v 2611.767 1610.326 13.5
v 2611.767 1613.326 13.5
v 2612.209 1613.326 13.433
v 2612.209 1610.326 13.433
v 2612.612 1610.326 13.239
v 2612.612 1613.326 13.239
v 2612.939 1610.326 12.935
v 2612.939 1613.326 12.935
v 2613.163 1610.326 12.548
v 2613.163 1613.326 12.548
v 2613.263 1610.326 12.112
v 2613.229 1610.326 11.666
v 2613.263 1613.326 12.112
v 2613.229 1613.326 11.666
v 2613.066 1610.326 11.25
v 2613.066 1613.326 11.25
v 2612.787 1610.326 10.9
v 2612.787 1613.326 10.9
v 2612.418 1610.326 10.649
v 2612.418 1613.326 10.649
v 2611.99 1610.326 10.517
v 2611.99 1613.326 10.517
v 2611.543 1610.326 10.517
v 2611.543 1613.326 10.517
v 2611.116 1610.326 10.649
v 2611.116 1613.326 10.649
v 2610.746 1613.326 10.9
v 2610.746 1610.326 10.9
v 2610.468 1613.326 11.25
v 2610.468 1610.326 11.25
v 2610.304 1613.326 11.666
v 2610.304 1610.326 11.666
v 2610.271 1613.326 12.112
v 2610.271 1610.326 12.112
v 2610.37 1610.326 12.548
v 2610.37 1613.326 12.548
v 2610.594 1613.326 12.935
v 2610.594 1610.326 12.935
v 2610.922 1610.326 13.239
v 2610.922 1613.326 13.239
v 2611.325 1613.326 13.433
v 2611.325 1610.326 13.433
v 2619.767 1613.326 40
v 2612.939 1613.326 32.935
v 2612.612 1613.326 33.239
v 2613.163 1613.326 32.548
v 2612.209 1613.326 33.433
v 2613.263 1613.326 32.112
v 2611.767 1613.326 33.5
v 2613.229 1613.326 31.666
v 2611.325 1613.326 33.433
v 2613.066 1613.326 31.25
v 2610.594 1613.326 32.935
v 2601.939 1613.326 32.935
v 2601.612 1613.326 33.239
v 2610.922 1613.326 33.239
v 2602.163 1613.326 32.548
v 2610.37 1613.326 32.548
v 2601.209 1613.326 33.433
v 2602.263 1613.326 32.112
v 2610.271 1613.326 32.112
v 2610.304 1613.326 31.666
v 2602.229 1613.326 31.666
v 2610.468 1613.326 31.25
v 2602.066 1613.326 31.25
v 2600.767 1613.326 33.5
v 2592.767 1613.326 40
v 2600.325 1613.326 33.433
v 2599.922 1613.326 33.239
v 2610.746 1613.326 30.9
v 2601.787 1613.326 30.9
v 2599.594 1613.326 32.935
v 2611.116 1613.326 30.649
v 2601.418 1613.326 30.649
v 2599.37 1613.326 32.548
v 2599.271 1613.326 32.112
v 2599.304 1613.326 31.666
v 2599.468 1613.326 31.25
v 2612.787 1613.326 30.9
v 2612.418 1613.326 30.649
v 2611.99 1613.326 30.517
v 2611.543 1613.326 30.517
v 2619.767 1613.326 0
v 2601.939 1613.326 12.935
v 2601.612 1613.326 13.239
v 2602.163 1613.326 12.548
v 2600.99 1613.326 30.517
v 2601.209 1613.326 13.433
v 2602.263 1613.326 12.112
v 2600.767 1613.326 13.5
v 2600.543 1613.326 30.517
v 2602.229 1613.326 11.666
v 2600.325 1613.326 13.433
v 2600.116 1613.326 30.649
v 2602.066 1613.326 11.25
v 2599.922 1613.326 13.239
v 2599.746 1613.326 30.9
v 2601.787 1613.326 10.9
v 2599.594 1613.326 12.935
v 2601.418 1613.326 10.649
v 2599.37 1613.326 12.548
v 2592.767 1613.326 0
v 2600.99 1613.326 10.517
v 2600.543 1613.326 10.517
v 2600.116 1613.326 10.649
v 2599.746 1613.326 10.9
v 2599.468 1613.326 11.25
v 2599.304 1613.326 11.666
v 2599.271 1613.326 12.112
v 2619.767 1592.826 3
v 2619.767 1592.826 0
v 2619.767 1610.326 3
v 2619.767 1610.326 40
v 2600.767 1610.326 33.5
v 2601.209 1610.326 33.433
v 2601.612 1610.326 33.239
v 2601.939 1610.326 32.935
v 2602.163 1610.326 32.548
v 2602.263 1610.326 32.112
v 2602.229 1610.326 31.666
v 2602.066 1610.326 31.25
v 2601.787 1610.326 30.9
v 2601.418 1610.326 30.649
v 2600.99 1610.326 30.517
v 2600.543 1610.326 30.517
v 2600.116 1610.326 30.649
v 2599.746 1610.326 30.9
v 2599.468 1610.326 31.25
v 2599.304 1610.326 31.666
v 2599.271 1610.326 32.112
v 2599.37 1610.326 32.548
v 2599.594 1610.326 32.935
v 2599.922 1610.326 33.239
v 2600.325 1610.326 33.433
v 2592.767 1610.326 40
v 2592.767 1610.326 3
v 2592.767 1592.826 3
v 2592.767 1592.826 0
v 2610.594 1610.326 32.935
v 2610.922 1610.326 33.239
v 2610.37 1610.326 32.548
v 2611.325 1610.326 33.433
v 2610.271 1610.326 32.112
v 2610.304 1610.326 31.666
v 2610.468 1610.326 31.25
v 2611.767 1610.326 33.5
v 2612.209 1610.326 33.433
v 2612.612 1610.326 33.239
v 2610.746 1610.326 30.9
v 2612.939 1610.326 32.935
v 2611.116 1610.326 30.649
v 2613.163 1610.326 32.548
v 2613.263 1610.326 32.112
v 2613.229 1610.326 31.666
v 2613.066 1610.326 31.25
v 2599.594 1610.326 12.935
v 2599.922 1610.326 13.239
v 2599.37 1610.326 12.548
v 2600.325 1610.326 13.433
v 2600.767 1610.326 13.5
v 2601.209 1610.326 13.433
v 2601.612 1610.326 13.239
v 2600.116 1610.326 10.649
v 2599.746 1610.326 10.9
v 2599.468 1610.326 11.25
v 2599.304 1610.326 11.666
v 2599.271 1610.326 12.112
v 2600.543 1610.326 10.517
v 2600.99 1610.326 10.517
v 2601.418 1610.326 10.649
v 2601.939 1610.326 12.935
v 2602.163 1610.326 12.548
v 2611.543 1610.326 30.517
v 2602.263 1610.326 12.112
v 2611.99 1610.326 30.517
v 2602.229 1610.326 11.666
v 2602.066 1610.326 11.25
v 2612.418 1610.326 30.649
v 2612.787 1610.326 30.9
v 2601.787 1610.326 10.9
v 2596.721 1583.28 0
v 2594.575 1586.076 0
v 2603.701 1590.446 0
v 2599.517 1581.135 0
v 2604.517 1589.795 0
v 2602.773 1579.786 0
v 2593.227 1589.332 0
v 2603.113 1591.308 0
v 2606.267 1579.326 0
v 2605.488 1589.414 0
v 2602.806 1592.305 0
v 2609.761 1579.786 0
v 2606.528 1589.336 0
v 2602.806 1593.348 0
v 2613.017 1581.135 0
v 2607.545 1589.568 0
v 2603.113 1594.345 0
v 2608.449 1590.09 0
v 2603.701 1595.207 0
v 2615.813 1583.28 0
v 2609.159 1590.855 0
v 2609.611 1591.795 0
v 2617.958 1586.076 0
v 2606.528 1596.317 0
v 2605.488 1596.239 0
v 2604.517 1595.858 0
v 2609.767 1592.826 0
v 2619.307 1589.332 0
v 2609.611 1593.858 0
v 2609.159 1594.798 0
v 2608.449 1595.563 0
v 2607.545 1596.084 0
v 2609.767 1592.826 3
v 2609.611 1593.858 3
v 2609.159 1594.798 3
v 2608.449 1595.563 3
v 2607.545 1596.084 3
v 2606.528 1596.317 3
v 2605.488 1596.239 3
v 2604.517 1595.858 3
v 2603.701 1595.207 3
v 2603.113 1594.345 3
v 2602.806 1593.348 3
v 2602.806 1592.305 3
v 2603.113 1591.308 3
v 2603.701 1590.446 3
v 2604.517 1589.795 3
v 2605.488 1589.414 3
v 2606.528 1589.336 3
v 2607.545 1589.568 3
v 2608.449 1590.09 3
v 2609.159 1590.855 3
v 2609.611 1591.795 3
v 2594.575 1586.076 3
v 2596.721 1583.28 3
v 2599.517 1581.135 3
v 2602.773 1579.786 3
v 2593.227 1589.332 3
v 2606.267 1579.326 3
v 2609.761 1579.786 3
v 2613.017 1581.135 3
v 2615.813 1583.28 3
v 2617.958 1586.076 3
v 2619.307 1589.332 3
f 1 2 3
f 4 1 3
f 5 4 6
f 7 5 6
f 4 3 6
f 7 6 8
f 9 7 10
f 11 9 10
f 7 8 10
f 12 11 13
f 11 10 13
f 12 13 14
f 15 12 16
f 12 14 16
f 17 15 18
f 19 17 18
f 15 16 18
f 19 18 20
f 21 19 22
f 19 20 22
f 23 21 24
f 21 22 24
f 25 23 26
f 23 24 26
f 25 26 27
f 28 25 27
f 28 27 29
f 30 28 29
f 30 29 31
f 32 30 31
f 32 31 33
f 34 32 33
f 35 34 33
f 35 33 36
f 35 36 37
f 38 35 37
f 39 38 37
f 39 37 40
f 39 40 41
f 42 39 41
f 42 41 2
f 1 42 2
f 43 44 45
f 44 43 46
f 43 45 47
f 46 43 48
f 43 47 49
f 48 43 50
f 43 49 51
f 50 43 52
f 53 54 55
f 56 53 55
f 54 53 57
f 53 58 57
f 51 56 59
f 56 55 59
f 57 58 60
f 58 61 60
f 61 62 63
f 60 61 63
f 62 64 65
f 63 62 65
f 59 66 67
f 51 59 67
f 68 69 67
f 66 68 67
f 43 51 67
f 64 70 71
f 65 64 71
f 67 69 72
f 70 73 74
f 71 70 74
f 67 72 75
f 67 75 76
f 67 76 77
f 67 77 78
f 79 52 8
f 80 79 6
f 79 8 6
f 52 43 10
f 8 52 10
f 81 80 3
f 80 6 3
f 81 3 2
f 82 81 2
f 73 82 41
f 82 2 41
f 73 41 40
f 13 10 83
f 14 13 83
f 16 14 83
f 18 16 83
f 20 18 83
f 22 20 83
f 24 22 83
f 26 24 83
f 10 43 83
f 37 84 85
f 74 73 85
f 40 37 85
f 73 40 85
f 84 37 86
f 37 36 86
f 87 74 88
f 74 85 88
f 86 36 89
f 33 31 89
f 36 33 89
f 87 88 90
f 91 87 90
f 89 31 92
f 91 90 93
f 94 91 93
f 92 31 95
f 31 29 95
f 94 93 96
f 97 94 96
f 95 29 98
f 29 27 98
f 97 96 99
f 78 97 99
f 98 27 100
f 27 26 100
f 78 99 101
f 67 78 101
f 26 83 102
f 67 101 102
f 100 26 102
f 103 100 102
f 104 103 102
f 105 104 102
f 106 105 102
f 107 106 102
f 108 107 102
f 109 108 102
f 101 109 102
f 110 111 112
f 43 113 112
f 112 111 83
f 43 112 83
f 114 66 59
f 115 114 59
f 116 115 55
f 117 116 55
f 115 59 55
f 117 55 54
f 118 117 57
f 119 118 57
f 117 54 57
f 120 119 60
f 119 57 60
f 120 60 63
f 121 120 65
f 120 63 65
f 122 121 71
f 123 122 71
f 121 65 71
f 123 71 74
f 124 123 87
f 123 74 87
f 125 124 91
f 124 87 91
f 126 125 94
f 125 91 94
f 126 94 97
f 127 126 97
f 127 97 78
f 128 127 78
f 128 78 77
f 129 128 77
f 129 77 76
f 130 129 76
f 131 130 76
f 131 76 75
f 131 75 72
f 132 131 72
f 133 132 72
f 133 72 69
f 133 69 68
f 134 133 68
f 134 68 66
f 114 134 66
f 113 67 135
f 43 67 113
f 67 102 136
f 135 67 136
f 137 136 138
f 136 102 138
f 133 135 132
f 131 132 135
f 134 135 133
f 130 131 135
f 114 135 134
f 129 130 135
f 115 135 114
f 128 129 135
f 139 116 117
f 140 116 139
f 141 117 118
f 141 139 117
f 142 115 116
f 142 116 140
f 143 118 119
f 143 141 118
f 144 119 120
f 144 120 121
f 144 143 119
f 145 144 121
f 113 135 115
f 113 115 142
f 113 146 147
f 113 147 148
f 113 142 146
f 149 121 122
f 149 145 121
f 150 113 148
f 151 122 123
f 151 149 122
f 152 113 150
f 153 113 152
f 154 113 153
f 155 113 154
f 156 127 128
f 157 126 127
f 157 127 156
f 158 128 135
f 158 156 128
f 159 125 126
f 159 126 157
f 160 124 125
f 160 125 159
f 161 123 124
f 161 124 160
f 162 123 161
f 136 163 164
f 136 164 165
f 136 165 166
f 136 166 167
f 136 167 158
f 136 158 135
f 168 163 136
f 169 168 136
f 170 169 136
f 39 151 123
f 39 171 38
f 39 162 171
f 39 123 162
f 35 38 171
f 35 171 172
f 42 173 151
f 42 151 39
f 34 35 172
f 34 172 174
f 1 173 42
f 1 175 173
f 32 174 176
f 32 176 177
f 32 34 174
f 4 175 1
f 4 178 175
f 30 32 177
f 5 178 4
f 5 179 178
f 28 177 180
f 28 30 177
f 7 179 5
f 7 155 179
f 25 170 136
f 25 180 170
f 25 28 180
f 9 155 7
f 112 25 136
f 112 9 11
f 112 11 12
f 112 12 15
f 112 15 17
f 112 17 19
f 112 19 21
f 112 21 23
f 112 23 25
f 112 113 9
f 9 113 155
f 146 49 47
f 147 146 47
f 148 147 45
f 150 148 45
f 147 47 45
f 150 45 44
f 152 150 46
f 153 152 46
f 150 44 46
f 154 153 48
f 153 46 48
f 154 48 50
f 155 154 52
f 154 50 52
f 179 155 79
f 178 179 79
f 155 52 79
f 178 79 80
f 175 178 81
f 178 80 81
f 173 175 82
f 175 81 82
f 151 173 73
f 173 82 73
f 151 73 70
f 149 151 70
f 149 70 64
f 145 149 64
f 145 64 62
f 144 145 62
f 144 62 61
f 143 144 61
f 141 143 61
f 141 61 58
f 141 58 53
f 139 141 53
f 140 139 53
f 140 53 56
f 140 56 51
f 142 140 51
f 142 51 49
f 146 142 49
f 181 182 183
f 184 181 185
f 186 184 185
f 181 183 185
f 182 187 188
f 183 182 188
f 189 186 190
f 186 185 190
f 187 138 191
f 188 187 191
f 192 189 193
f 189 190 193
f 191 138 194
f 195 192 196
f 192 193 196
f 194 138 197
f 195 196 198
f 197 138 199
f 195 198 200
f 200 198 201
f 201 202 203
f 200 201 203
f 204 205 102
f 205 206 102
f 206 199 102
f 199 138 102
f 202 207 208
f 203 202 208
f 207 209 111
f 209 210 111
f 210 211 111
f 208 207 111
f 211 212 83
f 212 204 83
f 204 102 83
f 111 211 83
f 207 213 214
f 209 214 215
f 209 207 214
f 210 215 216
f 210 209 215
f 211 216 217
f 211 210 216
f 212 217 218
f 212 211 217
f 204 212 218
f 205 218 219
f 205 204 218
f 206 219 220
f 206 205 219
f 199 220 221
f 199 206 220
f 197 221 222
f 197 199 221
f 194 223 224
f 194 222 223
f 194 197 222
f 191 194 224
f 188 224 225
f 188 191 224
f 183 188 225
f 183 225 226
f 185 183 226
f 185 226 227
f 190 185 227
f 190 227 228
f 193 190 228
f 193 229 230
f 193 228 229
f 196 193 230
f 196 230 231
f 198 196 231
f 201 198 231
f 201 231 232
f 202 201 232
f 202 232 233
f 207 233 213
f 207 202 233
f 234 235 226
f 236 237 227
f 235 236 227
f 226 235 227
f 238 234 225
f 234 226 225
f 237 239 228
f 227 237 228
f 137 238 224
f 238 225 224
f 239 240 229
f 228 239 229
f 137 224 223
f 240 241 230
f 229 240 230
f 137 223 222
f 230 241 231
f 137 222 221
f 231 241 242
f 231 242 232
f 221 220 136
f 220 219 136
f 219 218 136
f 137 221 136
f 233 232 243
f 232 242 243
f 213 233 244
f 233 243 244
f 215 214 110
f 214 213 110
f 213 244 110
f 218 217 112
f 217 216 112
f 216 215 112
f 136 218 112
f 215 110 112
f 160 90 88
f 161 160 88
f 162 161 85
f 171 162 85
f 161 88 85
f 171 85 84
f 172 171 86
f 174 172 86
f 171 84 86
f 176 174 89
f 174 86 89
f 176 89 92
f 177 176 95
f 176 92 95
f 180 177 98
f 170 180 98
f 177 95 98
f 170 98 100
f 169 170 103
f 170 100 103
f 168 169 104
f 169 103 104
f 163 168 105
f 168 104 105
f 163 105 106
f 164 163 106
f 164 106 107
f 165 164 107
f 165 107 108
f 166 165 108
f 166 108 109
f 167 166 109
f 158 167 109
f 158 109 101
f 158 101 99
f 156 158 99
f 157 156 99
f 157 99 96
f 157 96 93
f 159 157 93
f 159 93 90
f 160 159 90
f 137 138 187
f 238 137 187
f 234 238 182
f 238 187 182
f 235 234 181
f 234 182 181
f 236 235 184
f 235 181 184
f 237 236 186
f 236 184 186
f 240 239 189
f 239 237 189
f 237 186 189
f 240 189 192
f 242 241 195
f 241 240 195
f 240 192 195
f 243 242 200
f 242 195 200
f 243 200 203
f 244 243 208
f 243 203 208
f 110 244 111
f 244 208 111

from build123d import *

# Parameters (mm, degrees)
MODEL_R             = 3.5
EXTRUDE_1_DEPTH     = 40
SKETCH_3_W          = 37
SKETCH_3_H          = 37
CUT_EXTRUDE_1_DEPTH = 40
SKETCH_4_R          = 1.5
CUT_EXTRUDE_2_DEPTH = 40


with BuildPart() as part:
    # Model → 凸台-拉伸1 (new body)
    with BuildSketch(Plane.XY):
        with BuildLine():
            Line((2619.766714505, 1592.826425633), (2619.766714505, 1613.326425633))
            Line((2619.766714505, 1613.326425633), (2592.766714505, 1613.326425633))
            Line((2592.766714505, 1613.326425633), (2592.766714505, 1592.826425633))
            ThreePointArc((2592.766714505, 1592.826425633), (2606.266714505, 1579.326425633), (2619.766714505, 1592.826425633))
        make_face()
        with Locations((2606.266714505, 1592.826425633)):
            Circle(MODEL_R, mode=Mode.SUBTRACT)
    extrude(amount=EXTRUDE_1_DEPTH)

    # 草图3 → 切除-拉伸1 (cut)
    with BuildSketch(Plane(origin=(2619.766714505, 0, 0), x_dir=(0, 0, -1), z_dir=(1, 0, 0))):
        with Locations((-21.5, 1591.826425633)):
            Rectangle(SKETCH_3_W, SKETCH_3_H)
    extrude(amount=-CUT_EXTRUDE_1_DEPTH, mode=Mode.SUBTRACT)

    # 草图4 → 切除-拉伸2 (cut)
    with BuildSketch(Plane(origin=(0, 1613.326425633, 0), x_dir=(1, 0, 0), z_dir=(0, 1, 0))):
        with Locations(Location((2600.766714505, -32, 0), (0, 0, 270))):
            Circle(SKETCH_4_R)
        with Locations(Location((2611.766714505, -32, 0), (0, 0, 270))):
            Circle(SKETCH_4_R)
        with Locations(Location((2600.766714505, -12, 0), (0, 0, 270))):
            Circle(SKETCH_4_R)
        with Locations(Location((2611.766714505, -12, 0), (0, 0, 270))):
            Circle(SKETCH_4_R)
    extrude(amount=-CUT_EXTRUDE_2_DEPTH, mode=Mode.SUBTRACT)


solid = part.part
